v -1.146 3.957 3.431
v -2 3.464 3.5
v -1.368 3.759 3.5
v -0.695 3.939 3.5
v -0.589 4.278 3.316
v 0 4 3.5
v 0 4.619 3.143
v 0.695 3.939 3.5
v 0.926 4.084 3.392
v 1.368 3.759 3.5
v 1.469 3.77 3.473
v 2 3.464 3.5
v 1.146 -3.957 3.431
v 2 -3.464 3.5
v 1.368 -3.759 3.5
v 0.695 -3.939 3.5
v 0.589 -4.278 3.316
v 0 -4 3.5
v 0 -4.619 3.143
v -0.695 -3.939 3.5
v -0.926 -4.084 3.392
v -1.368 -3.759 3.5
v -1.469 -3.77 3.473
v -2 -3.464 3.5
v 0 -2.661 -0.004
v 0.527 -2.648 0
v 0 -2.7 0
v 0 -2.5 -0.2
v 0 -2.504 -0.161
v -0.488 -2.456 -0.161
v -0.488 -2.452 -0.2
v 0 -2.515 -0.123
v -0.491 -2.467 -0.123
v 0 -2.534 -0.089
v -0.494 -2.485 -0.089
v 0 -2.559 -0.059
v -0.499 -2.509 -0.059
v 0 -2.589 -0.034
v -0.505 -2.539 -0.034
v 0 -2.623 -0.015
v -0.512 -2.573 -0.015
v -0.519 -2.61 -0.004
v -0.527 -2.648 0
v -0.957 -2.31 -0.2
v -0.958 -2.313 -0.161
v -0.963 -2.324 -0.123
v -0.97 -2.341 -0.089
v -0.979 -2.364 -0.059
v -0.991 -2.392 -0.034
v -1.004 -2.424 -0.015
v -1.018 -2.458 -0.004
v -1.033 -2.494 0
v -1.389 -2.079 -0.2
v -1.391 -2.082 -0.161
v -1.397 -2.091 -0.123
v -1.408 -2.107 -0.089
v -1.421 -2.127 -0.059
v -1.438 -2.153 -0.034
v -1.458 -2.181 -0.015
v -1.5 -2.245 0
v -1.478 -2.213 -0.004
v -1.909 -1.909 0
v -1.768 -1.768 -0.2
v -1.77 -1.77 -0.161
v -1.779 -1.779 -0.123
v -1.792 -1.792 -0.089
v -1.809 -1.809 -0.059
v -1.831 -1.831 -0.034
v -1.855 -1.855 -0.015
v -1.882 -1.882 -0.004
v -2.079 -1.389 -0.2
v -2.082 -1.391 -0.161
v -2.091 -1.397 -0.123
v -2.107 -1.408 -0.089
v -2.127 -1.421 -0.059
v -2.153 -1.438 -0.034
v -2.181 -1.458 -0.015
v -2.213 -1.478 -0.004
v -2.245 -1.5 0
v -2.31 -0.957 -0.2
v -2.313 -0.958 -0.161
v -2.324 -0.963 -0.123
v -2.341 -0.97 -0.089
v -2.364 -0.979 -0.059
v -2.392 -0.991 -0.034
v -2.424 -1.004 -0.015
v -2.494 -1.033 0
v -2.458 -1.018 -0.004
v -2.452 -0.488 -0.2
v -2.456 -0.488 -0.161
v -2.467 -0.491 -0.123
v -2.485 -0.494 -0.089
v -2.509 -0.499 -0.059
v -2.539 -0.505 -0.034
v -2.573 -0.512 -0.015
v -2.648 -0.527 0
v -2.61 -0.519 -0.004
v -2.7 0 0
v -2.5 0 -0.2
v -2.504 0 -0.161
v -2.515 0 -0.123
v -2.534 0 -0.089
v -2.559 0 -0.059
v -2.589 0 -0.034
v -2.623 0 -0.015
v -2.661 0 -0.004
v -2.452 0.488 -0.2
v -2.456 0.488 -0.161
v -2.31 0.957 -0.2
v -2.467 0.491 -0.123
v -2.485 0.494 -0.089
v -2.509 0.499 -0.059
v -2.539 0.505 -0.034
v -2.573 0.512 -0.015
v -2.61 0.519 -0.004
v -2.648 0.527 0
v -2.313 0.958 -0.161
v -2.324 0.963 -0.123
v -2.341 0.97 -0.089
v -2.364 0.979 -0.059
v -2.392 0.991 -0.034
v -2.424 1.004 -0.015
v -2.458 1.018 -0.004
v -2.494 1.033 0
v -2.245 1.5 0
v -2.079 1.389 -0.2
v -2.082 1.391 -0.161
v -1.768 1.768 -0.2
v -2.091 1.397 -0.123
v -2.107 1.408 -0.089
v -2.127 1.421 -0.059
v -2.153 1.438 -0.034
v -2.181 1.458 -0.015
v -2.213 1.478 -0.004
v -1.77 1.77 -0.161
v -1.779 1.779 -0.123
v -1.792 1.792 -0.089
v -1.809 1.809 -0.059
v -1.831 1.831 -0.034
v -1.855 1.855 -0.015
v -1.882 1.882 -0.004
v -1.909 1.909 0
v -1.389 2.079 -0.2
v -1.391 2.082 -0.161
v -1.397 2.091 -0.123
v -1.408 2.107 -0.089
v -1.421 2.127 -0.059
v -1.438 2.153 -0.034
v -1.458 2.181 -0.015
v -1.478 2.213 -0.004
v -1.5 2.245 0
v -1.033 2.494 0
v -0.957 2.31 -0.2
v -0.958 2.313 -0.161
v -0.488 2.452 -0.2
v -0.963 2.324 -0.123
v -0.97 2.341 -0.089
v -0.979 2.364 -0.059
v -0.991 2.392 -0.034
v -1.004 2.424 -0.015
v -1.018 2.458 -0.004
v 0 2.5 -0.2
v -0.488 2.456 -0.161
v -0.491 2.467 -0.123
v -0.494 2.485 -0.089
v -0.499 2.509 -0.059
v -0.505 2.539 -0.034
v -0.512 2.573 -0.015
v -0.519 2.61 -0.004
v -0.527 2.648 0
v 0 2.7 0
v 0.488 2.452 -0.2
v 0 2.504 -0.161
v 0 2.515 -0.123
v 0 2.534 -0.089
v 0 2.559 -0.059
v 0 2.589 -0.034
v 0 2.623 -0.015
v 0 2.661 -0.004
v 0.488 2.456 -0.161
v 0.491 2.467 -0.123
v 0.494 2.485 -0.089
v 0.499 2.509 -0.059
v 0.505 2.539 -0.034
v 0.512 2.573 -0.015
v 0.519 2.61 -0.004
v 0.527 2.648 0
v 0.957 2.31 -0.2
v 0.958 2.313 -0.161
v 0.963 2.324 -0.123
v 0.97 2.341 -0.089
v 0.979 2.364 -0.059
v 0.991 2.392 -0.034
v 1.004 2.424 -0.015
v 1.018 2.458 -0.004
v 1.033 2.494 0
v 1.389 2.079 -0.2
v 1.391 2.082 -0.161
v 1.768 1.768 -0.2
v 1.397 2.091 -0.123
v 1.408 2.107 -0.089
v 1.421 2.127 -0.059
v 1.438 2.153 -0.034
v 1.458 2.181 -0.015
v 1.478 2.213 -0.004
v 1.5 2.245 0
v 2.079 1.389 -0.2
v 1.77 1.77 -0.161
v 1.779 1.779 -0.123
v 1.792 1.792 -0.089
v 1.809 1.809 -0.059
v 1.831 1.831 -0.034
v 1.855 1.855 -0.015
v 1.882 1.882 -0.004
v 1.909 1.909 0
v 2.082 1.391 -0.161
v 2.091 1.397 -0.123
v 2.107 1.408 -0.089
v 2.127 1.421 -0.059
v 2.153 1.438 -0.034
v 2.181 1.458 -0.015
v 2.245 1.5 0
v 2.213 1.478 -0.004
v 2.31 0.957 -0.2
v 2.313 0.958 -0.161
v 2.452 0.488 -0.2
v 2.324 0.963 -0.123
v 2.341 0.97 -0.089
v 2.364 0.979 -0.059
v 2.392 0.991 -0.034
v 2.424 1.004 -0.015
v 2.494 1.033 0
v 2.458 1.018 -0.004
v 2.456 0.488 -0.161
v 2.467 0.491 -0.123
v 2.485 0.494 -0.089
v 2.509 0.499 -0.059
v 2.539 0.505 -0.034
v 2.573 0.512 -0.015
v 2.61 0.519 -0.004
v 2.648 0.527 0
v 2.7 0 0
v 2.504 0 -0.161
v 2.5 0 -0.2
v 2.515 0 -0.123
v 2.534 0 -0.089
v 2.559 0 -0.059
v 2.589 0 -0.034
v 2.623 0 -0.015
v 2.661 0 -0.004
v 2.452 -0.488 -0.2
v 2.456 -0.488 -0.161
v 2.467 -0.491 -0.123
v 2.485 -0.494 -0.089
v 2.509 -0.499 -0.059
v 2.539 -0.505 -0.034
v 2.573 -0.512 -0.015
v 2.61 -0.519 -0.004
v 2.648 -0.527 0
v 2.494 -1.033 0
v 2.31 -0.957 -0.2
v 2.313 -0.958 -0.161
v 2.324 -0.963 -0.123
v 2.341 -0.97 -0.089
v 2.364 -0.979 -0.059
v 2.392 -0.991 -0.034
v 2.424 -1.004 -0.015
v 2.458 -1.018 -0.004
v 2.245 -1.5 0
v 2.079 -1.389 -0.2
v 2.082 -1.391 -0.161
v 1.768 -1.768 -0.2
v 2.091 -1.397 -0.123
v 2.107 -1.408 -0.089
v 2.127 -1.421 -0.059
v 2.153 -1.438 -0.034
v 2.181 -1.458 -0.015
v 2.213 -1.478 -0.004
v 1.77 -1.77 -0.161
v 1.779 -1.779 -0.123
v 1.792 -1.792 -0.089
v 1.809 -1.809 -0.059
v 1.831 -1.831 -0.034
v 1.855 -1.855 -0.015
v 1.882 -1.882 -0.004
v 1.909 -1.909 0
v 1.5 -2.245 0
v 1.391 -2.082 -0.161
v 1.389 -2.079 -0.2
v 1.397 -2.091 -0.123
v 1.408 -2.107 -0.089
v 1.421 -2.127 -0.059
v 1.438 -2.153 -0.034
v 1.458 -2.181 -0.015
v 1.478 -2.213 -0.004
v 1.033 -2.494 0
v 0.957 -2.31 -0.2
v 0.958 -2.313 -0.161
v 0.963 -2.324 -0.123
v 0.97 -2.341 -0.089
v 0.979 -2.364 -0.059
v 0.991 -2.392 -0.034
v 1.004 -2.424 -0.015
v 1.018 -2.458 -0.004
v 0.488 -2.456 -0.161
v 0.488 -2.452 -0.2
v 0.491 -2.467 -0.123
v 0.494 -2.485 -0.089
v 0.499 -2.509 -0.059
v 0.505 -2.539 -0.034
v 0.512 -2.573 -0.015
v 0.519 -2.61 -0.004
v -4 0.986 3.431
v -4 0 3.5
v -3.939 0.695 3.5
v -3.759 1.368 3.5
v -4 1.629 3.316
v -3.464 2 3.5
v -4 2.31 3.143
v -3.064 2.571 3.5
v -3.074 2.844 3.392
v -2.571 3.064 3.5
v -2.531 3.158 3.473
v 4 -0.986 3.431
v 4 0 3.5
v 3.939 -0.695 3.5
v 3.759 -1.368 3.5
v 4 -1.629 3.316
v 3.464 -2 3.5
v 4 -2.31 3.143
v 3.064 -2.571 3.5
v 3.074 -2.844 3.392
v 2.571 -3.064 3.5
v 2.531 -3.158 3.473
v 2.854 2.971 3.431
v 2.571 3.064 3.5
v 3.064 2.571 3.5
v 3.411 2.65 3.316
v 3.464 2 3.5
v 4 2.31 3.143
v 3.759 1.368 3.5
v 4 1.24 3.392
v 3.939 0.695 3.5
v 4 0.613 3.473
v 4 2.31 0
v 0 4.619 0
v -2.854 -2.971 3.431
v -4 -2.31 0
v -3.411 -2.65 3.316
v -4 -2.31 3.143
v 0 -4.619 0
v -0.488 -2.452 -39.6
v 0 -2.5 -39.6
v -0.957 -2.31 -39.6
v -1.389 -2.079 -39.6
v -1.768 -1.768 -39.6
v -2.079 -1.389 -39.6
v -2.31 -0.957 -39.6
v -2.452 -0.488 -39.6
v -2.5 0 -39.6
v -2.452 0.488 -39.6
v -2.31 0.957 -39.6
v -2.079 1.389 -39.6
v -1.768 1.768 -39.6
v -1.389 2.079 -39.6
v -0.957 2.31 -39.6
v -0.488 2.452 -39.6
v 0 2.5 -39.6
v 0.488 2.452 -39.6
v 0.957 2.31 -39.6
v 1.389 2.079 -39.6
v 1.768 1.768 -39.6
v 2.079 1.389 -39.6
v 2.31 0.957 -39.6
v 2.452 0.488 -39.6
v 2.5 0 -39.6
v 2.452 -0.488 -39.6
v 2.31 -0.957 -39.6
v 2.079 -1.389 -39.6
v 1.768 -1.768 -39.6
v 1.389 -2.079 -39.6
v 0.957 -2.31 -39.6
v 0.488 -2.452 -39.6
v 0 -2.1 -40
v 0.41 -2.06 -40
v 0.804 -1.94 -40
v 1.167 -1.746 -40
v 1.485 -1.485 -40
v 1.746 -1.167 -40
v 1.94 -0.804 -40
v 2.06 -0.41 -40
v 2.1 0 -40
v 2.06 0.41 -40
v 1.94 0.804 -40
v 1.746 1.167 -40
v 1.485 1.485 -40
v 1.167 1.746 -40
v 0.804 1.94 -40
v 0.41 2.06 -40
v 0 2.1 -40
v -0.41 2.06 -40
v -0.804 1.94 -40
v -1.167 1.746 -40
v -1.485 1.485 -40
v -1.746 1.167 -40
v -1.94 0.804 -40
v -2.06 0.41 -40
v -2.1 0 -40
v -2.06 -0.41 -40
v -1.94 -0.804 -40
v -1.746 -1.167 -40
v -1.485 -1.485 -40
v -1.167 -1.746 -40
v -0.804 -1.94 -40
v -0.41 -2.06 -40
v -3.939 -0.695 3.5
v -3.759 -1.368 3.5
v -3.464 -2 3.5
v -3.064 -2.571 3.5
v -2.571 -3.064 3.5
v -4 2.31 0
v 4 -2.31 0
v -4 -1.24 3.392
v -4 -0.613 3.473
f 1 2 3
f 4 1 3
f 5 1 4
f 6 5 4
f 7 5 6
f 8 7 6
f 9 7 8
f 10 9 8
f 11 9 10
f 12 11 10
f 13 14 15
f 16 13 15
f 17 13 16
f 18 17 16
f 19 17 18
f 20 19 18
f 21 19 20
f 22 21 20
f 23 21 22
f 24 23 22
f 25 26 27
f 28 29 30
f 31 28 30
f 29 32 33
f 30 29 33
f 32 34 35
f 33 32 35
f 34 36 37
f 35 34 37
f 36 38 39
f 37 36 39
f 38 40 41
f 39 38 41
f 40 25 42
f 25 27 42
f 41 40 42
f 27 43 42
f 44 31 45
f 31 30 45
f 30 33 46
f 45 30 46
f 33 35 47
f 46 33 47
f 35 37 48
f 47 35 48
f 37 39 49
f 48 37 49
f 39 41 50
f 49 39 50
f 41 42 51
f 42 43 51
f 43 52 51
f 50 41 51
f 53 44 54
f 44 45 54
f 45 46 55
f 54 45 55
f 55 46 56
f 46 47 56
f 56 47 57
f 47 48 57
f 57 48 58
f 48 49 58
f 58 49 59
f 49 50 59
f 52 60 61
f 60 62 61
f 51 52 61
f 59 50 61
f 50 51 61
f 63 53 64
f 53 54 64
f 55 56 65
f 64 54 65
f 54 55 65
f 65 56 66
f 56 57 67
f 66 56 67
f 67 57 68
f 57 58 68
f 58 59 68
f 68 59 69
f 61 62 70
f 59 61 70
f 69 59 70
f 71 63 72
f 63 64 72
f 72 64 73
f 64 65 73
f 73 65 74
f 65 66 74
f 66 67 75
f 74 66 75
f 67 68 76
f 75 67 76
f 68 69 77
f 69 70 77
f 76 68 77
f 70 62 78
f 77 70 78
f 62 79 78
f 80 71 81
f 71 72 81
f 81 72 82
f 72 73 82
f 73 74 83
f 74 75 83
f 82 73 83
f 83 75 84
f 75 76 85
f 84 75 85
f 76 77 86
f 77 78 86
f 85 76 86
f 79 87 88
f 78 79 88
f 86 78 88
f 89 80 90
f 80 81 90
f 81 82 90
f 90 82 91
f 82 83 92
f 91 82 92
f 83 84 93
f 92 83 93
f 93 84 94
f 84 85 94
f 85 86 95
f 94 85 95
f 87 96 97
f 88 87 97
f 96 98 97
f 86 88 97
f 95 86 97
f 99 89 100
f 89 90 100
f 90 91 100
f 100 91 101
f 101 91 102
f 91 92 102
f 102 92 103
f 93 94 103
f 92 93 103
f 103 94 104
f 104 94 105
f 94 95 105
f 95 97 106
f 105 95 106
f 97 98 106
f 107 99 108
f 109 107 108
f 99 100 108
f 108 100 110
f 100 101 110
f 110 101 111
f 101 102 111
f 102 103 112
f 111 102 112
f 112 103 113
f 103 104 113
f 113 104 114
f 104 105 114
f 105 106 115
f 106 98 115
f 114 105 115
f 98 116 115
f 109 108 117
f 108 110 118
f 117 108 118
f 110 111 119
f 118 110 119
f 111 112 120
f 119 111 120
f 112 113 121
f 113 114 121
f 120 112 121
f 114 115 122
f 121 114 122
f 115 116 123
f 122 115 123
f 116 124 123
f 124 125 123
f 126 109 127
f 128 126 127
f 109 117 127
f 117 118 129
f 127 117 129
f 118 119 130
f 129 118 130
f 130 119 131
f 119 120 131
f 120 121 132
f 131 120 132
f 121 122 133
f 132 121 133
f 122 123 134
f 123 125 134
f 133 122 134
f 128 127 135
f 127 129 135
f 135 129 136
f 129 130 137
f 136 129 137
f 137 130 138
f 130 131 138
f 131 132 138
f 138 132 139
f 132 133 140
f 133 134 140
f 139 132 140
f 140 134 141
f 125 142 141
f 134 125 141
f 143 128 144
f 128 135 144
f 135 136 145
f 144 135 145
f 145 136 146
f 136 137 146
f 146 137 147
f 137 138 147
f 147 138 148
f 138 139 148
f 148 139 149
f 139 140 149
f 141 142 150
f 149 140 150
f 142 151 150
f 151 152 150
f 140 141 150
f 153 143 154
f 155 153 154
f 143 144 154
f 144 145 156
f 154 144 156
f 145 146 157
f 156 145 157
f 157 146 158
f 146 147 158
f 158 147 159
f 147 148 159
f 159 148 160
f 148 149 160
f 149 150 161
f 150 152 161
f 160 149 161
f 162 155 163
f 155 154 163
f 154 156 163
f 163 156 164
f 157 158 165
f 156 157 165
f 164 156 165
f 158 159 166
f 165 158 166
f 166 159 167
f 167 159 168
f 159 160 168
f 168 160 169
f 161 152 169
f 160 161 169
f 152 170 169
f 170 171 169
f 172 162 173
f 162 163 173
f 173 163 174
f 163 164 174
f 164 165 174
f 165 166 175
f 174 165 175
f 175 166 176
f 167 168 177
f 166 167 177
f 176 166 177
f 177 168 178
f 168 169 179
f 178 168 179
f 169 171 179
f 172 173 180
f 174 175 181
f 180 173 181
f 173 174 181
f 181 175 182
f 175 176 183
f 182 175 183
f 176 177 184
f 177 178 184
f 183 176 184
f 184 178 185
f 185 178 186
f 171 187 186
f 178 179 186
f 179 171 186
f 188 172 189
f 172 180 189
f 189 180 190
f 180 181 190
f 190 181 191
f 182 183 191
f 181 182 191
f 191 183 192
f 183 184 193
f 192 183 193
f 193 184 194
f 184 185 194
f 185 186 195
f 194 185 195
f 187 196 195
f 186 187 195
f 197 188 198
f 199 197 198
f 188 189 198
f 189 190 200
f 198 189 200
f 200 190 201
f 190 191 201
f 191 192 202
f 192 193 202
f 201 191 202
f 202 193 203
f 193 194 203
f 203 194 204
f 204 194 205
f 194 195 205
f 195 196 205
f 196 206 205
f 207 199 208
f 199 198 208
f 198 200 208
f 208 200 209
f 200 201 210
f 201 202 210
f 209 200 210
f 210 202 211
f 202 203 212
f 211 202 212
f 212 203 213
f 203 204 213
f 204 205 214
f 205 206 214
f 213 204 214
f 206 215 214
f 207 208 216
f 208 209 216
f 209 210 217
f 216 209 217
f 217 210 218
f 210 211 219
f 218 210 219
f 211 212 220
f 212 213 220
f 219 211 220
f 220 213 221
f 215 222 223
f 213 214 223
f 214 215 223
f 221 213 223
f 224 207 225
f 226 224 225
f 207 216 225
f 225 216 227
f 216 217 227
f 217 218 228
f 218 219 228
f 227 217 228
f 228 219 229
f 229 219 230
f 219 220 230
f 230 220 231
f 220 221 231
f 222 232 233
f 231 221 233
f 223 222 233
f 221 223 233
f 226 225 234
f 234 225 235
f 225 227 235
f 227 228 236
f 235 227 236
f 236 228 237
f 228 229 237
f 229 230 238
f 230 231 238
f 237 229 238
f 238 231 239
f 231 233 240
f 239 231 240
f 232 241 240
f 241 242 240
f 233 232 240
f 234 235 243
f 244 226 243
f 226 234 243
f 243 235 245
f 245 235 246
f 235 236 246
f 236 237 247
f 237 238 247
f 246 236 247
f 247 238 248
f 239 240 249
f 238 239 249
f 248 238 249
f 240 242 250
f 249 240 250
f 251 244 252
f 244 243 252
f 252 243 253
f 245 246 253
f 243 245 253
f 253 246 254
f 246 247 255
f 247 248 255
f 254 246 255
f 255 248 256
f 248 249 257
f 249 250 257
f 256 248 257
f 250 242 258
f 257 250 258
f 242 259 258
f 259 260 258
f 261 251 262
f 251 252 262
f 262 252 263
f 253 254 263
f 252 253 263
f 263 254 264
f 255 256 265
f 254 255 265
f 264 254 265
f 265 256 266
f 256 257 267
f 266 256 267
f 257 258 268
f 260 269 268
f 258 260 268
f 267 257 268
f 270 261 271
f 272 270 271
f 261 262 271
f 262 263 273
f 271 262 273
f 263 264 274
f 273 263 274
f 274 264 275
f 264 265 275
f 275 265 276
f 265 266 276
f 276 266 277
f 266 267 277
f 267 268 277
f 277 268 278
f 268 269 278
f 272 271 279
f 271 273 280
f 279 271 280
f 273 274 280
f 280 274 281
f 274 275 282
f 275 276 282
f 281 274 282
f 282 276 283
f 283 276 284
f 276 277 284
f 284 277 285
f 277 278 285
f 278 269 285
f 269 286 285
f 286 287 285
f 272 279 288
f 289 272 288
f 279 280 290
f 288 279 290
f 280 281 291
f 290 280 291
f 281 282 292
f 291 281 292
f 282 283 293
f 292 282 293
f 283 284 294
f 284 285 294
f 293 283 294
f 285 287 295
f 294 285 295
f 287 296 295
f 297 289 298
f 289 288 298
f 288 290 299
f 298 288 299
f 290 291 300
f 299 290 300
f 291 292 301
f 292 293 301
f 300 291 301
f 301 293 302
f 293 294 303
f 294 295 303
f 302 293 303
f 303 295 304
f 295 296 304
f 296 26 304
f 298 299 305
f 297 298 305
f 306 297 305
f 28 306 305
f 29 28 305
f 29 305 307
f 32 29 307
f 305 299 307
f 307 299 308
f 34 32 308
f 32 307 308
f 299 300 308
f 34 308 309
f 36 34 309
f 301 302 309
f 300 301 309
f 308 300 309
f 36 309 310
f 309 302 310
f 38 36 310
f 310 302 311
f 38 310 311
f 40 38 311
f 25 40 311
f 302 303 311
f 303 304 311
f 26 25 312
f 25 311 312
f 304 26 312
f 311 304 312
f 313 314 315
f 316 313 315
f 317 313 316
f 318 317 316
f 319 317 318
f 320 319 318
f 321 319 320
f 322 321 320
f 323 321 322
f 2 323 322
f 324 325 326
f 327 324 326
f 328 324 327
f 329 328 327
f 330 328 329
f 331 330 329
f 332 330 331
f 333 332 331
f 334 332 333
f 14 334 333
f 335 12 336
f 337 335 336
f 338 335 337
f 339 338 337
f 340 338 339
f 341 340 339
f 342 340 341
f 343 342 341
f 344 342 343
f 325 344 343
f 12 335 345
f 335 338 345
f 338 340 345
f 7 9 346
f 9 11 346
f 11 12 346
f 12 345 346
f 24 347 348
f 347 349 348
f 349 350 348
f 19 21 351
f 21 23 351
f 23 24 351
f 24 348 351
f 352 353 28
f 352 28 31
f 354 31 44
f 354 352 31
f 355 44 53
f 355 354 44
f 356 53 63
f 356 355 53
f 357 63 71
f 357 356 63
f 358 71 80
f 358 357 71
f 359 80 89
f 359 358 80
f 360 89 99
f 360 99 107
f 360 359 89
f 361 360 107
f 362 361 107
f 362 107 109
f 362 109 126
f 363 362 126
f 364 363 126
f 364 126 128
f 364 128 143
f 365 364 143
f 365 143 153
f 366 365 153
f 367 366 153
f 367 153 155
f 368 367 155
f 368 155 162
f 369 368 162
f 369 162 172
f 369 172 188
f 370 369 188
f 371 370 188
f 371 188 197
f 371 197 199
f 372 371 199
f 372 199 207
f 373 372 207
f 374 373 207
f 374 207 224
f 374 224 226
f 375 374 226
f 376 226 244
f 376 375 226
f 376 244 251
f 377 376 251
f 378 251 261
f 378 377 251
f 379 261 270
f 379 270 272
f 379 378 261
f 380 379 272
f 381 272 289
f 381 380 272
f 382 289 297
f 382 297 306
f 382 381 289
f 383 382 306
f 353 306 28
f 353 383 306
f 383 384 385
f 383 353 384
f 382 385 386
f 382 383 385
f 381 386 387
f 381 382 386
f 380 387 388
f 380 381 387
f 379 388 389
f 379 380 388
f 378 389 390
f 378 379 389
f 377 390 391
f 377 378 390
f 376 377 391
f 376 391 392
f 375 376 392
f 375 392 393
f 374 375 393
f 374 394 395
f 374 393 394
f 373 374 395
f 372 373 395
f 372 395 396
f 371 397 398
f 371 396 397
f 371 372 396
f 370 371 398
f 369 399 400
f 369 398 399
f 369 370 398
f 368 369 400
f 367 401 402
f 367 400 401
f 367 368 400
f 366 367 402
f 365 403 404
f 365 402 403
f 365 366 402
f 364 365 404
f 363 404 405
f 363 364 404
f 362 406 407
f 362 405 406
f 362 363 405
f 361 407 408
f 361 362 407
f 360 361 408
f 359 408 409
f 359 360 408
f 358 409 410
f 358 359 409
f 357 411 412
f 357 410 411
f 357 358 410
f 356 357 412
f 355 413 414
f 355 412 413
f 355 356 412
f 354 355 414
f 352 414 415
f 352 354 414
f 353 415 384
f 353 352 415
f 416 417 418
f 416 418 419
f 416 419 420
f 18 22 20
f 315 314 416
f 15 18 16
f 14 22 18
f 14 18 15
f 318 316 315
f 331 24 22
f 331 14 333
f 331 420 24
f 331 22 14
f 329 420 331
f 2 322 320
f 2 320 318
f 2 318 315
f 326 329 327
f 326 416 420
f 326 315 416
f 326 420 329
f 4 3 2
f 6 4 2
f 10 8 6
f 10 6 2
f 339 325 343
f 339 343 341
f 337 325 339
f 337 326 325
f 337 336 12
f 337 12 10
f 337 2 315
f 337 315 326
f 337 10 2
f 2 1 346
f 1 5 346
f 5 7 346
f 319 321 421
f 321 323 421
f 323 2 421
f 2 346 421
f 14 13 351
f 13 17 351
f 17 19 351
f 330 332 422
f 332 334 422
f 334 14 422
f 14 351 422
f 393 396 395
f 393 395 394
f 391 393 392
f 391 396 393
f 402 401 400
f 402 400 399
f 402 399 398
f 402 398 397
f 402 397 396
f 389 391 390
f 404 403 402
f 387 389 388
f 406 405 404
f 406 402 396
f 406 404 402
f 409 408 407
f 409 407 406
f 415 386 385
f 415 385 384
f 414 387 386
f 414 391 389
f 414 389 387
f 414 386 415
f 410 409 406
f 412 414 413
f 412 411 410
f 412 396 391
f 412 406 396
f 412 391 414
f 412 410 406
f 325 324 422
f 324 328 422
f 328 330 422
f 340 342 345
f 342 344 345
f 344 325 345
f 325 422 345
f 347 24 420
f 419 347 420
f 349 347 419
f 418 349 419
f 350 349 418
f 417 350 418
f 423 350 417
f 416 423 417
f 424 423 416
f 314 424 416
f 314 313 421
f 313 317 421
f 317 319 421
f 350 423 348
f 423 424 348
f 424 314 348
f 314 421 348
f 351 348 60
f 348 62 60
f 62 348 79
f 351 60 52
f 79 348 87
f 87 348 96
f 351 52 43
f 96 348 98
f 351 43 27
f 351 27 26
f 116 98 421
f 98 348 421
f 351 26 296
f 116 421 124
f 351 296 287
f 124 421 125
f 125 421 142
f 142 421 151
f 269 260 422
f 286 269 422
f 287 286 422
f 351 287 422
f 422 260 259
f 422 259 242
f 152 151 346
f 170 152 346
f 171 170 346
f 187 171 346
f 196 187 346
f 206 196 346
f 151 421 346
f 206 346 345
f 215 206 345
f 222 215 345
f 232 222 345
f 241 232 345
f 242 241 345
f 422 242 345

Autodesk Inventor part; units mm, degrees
ref_plane "WorkPlane1" through (0, 0, 0) normal (0, 0, 1) x (1, 0, 0)
sketch "Sketch1" plane through (0, 0, 0) normal (0, 0, 1) x (1, 0, 0)
  point P0 (0, 0)
sketch "Sketch2" plane through (0, 0, 0) normal (0, 0, 1) x (1, 0, 0)
  line L0 (-4, 2.3095) -> (-4, -2.3095)
  line L1 (0, 4.6187) -> (-4, 2.3095)
  line L2 (4, 2.3095) -> (0, 4.6187)
  line L3 (4, -2.3095) -> (4, 2.3095)
  line L4 (0, -4.6187) -> (4, -2.3095)
  line L5 (-4, -2.3095) -> (0, -4.6187)
  circle A0 centre (0, 0) radius 4 construction
  dimension "d1" = 8
  dimension "d29" = 0
  dimension "d30" = 0
extrude "Extrusion1" add sketch "Sketch2" along normal blind 3.5
sketch "Sketch3" plane through (0, 0, 0) normal (1, 0, 0) x (0, 1, 0)
  line L0 (4, 3.5) -> (4.7187, 3.5)
  line L1 (4.7187, 3.085) -> (4, 3.5)
  line L2 (4.7187, 3.5) -> (4.7187, 3.085)
  line L3 (0, -0.7) -> (0, 4.2) projected
  line L4 (4.6187, 0) -> (4.6187, 3.5) projected
  dimension "d25" = 0.1
  dimension "d26" = 0
  dimension "d27" = 60
  dimension "d28" = 4
revolve "Revolution1" cut sketch "Sketch3" angle 360 about axis through (0, 0, -10) along (0, 0, 1)
sketch "Sketch4" plane through (0, 0, 0) normal (1, 0, 0) x (0, 1, 0)
  line L0 (0, -40) -> (0, 0)
  line L1 (-2.5, -40) -> (0, -40)
  line L2 (-2.5, 0) -> (-2.5, -40)
  line L3 (0, 0) -> (-2.5, 0)
  line L4 (0, -40) -> (0, 0)
  line L5 (-3, 0) -> (0.5, 0) projected
  line L6 (0, -48) -> (0, 8) projected
  dimension "d18" = 2.5
  dimension "d20" = 40
  dimension "d33" = 0
  dimension "d34" = 0
revolve "Revolution2" add sketch "Sketch4" angle 360 about axis through (0, 0, -40) along (0, 0, -1)
chamfer "Chamfer1" distance 0.4 angle 45 1 edges at (0, 2.5, -40)
fillet "Fillet1" radius 0.2 1 edges at (0, 2.5, 0)
thread "Thread1" size "M5x0.8" class "6g" standard "ISO Metric profile" length 38.4
ref_plane "MSC_PF1" through (0, 0, 0) normal (1, 0, 0) x (0, 1, 0)
ref_plane "MSC_PT1" through (0, 0, 0) normal (0, 0, -1) x (-1, 0, 0)
equation "\"d22\" = 0.5 * PTC"
equation "\"d23\" = 0.5 * PTC"
equation "\"d24\" = r"
equation "\"d1\" = ParS"
equation "\"d6\" = ParK"
equation "\"b\" = NLG - 2 * PTC"
equation "\"d28\" = 0.5 * ParS"
equation "\"d18\" = 0.5 * NND"
equation "\"d20\" = NLG"
equation "\"NND\" = 5"
equation "\"NLG\" = 40"
equation "\"PTC\" = 0.8"
equation "\"ParK\" = 3.5"
equation "\"ParS\" = 8"
equation "\"msp_es\" = 0.577367 * ParS"
equation "\"r\" = 0.2"
equation "\"THREADDIA\" = NND"
properties part number "ISO 4018 - M5 x 40" material "Steel"
